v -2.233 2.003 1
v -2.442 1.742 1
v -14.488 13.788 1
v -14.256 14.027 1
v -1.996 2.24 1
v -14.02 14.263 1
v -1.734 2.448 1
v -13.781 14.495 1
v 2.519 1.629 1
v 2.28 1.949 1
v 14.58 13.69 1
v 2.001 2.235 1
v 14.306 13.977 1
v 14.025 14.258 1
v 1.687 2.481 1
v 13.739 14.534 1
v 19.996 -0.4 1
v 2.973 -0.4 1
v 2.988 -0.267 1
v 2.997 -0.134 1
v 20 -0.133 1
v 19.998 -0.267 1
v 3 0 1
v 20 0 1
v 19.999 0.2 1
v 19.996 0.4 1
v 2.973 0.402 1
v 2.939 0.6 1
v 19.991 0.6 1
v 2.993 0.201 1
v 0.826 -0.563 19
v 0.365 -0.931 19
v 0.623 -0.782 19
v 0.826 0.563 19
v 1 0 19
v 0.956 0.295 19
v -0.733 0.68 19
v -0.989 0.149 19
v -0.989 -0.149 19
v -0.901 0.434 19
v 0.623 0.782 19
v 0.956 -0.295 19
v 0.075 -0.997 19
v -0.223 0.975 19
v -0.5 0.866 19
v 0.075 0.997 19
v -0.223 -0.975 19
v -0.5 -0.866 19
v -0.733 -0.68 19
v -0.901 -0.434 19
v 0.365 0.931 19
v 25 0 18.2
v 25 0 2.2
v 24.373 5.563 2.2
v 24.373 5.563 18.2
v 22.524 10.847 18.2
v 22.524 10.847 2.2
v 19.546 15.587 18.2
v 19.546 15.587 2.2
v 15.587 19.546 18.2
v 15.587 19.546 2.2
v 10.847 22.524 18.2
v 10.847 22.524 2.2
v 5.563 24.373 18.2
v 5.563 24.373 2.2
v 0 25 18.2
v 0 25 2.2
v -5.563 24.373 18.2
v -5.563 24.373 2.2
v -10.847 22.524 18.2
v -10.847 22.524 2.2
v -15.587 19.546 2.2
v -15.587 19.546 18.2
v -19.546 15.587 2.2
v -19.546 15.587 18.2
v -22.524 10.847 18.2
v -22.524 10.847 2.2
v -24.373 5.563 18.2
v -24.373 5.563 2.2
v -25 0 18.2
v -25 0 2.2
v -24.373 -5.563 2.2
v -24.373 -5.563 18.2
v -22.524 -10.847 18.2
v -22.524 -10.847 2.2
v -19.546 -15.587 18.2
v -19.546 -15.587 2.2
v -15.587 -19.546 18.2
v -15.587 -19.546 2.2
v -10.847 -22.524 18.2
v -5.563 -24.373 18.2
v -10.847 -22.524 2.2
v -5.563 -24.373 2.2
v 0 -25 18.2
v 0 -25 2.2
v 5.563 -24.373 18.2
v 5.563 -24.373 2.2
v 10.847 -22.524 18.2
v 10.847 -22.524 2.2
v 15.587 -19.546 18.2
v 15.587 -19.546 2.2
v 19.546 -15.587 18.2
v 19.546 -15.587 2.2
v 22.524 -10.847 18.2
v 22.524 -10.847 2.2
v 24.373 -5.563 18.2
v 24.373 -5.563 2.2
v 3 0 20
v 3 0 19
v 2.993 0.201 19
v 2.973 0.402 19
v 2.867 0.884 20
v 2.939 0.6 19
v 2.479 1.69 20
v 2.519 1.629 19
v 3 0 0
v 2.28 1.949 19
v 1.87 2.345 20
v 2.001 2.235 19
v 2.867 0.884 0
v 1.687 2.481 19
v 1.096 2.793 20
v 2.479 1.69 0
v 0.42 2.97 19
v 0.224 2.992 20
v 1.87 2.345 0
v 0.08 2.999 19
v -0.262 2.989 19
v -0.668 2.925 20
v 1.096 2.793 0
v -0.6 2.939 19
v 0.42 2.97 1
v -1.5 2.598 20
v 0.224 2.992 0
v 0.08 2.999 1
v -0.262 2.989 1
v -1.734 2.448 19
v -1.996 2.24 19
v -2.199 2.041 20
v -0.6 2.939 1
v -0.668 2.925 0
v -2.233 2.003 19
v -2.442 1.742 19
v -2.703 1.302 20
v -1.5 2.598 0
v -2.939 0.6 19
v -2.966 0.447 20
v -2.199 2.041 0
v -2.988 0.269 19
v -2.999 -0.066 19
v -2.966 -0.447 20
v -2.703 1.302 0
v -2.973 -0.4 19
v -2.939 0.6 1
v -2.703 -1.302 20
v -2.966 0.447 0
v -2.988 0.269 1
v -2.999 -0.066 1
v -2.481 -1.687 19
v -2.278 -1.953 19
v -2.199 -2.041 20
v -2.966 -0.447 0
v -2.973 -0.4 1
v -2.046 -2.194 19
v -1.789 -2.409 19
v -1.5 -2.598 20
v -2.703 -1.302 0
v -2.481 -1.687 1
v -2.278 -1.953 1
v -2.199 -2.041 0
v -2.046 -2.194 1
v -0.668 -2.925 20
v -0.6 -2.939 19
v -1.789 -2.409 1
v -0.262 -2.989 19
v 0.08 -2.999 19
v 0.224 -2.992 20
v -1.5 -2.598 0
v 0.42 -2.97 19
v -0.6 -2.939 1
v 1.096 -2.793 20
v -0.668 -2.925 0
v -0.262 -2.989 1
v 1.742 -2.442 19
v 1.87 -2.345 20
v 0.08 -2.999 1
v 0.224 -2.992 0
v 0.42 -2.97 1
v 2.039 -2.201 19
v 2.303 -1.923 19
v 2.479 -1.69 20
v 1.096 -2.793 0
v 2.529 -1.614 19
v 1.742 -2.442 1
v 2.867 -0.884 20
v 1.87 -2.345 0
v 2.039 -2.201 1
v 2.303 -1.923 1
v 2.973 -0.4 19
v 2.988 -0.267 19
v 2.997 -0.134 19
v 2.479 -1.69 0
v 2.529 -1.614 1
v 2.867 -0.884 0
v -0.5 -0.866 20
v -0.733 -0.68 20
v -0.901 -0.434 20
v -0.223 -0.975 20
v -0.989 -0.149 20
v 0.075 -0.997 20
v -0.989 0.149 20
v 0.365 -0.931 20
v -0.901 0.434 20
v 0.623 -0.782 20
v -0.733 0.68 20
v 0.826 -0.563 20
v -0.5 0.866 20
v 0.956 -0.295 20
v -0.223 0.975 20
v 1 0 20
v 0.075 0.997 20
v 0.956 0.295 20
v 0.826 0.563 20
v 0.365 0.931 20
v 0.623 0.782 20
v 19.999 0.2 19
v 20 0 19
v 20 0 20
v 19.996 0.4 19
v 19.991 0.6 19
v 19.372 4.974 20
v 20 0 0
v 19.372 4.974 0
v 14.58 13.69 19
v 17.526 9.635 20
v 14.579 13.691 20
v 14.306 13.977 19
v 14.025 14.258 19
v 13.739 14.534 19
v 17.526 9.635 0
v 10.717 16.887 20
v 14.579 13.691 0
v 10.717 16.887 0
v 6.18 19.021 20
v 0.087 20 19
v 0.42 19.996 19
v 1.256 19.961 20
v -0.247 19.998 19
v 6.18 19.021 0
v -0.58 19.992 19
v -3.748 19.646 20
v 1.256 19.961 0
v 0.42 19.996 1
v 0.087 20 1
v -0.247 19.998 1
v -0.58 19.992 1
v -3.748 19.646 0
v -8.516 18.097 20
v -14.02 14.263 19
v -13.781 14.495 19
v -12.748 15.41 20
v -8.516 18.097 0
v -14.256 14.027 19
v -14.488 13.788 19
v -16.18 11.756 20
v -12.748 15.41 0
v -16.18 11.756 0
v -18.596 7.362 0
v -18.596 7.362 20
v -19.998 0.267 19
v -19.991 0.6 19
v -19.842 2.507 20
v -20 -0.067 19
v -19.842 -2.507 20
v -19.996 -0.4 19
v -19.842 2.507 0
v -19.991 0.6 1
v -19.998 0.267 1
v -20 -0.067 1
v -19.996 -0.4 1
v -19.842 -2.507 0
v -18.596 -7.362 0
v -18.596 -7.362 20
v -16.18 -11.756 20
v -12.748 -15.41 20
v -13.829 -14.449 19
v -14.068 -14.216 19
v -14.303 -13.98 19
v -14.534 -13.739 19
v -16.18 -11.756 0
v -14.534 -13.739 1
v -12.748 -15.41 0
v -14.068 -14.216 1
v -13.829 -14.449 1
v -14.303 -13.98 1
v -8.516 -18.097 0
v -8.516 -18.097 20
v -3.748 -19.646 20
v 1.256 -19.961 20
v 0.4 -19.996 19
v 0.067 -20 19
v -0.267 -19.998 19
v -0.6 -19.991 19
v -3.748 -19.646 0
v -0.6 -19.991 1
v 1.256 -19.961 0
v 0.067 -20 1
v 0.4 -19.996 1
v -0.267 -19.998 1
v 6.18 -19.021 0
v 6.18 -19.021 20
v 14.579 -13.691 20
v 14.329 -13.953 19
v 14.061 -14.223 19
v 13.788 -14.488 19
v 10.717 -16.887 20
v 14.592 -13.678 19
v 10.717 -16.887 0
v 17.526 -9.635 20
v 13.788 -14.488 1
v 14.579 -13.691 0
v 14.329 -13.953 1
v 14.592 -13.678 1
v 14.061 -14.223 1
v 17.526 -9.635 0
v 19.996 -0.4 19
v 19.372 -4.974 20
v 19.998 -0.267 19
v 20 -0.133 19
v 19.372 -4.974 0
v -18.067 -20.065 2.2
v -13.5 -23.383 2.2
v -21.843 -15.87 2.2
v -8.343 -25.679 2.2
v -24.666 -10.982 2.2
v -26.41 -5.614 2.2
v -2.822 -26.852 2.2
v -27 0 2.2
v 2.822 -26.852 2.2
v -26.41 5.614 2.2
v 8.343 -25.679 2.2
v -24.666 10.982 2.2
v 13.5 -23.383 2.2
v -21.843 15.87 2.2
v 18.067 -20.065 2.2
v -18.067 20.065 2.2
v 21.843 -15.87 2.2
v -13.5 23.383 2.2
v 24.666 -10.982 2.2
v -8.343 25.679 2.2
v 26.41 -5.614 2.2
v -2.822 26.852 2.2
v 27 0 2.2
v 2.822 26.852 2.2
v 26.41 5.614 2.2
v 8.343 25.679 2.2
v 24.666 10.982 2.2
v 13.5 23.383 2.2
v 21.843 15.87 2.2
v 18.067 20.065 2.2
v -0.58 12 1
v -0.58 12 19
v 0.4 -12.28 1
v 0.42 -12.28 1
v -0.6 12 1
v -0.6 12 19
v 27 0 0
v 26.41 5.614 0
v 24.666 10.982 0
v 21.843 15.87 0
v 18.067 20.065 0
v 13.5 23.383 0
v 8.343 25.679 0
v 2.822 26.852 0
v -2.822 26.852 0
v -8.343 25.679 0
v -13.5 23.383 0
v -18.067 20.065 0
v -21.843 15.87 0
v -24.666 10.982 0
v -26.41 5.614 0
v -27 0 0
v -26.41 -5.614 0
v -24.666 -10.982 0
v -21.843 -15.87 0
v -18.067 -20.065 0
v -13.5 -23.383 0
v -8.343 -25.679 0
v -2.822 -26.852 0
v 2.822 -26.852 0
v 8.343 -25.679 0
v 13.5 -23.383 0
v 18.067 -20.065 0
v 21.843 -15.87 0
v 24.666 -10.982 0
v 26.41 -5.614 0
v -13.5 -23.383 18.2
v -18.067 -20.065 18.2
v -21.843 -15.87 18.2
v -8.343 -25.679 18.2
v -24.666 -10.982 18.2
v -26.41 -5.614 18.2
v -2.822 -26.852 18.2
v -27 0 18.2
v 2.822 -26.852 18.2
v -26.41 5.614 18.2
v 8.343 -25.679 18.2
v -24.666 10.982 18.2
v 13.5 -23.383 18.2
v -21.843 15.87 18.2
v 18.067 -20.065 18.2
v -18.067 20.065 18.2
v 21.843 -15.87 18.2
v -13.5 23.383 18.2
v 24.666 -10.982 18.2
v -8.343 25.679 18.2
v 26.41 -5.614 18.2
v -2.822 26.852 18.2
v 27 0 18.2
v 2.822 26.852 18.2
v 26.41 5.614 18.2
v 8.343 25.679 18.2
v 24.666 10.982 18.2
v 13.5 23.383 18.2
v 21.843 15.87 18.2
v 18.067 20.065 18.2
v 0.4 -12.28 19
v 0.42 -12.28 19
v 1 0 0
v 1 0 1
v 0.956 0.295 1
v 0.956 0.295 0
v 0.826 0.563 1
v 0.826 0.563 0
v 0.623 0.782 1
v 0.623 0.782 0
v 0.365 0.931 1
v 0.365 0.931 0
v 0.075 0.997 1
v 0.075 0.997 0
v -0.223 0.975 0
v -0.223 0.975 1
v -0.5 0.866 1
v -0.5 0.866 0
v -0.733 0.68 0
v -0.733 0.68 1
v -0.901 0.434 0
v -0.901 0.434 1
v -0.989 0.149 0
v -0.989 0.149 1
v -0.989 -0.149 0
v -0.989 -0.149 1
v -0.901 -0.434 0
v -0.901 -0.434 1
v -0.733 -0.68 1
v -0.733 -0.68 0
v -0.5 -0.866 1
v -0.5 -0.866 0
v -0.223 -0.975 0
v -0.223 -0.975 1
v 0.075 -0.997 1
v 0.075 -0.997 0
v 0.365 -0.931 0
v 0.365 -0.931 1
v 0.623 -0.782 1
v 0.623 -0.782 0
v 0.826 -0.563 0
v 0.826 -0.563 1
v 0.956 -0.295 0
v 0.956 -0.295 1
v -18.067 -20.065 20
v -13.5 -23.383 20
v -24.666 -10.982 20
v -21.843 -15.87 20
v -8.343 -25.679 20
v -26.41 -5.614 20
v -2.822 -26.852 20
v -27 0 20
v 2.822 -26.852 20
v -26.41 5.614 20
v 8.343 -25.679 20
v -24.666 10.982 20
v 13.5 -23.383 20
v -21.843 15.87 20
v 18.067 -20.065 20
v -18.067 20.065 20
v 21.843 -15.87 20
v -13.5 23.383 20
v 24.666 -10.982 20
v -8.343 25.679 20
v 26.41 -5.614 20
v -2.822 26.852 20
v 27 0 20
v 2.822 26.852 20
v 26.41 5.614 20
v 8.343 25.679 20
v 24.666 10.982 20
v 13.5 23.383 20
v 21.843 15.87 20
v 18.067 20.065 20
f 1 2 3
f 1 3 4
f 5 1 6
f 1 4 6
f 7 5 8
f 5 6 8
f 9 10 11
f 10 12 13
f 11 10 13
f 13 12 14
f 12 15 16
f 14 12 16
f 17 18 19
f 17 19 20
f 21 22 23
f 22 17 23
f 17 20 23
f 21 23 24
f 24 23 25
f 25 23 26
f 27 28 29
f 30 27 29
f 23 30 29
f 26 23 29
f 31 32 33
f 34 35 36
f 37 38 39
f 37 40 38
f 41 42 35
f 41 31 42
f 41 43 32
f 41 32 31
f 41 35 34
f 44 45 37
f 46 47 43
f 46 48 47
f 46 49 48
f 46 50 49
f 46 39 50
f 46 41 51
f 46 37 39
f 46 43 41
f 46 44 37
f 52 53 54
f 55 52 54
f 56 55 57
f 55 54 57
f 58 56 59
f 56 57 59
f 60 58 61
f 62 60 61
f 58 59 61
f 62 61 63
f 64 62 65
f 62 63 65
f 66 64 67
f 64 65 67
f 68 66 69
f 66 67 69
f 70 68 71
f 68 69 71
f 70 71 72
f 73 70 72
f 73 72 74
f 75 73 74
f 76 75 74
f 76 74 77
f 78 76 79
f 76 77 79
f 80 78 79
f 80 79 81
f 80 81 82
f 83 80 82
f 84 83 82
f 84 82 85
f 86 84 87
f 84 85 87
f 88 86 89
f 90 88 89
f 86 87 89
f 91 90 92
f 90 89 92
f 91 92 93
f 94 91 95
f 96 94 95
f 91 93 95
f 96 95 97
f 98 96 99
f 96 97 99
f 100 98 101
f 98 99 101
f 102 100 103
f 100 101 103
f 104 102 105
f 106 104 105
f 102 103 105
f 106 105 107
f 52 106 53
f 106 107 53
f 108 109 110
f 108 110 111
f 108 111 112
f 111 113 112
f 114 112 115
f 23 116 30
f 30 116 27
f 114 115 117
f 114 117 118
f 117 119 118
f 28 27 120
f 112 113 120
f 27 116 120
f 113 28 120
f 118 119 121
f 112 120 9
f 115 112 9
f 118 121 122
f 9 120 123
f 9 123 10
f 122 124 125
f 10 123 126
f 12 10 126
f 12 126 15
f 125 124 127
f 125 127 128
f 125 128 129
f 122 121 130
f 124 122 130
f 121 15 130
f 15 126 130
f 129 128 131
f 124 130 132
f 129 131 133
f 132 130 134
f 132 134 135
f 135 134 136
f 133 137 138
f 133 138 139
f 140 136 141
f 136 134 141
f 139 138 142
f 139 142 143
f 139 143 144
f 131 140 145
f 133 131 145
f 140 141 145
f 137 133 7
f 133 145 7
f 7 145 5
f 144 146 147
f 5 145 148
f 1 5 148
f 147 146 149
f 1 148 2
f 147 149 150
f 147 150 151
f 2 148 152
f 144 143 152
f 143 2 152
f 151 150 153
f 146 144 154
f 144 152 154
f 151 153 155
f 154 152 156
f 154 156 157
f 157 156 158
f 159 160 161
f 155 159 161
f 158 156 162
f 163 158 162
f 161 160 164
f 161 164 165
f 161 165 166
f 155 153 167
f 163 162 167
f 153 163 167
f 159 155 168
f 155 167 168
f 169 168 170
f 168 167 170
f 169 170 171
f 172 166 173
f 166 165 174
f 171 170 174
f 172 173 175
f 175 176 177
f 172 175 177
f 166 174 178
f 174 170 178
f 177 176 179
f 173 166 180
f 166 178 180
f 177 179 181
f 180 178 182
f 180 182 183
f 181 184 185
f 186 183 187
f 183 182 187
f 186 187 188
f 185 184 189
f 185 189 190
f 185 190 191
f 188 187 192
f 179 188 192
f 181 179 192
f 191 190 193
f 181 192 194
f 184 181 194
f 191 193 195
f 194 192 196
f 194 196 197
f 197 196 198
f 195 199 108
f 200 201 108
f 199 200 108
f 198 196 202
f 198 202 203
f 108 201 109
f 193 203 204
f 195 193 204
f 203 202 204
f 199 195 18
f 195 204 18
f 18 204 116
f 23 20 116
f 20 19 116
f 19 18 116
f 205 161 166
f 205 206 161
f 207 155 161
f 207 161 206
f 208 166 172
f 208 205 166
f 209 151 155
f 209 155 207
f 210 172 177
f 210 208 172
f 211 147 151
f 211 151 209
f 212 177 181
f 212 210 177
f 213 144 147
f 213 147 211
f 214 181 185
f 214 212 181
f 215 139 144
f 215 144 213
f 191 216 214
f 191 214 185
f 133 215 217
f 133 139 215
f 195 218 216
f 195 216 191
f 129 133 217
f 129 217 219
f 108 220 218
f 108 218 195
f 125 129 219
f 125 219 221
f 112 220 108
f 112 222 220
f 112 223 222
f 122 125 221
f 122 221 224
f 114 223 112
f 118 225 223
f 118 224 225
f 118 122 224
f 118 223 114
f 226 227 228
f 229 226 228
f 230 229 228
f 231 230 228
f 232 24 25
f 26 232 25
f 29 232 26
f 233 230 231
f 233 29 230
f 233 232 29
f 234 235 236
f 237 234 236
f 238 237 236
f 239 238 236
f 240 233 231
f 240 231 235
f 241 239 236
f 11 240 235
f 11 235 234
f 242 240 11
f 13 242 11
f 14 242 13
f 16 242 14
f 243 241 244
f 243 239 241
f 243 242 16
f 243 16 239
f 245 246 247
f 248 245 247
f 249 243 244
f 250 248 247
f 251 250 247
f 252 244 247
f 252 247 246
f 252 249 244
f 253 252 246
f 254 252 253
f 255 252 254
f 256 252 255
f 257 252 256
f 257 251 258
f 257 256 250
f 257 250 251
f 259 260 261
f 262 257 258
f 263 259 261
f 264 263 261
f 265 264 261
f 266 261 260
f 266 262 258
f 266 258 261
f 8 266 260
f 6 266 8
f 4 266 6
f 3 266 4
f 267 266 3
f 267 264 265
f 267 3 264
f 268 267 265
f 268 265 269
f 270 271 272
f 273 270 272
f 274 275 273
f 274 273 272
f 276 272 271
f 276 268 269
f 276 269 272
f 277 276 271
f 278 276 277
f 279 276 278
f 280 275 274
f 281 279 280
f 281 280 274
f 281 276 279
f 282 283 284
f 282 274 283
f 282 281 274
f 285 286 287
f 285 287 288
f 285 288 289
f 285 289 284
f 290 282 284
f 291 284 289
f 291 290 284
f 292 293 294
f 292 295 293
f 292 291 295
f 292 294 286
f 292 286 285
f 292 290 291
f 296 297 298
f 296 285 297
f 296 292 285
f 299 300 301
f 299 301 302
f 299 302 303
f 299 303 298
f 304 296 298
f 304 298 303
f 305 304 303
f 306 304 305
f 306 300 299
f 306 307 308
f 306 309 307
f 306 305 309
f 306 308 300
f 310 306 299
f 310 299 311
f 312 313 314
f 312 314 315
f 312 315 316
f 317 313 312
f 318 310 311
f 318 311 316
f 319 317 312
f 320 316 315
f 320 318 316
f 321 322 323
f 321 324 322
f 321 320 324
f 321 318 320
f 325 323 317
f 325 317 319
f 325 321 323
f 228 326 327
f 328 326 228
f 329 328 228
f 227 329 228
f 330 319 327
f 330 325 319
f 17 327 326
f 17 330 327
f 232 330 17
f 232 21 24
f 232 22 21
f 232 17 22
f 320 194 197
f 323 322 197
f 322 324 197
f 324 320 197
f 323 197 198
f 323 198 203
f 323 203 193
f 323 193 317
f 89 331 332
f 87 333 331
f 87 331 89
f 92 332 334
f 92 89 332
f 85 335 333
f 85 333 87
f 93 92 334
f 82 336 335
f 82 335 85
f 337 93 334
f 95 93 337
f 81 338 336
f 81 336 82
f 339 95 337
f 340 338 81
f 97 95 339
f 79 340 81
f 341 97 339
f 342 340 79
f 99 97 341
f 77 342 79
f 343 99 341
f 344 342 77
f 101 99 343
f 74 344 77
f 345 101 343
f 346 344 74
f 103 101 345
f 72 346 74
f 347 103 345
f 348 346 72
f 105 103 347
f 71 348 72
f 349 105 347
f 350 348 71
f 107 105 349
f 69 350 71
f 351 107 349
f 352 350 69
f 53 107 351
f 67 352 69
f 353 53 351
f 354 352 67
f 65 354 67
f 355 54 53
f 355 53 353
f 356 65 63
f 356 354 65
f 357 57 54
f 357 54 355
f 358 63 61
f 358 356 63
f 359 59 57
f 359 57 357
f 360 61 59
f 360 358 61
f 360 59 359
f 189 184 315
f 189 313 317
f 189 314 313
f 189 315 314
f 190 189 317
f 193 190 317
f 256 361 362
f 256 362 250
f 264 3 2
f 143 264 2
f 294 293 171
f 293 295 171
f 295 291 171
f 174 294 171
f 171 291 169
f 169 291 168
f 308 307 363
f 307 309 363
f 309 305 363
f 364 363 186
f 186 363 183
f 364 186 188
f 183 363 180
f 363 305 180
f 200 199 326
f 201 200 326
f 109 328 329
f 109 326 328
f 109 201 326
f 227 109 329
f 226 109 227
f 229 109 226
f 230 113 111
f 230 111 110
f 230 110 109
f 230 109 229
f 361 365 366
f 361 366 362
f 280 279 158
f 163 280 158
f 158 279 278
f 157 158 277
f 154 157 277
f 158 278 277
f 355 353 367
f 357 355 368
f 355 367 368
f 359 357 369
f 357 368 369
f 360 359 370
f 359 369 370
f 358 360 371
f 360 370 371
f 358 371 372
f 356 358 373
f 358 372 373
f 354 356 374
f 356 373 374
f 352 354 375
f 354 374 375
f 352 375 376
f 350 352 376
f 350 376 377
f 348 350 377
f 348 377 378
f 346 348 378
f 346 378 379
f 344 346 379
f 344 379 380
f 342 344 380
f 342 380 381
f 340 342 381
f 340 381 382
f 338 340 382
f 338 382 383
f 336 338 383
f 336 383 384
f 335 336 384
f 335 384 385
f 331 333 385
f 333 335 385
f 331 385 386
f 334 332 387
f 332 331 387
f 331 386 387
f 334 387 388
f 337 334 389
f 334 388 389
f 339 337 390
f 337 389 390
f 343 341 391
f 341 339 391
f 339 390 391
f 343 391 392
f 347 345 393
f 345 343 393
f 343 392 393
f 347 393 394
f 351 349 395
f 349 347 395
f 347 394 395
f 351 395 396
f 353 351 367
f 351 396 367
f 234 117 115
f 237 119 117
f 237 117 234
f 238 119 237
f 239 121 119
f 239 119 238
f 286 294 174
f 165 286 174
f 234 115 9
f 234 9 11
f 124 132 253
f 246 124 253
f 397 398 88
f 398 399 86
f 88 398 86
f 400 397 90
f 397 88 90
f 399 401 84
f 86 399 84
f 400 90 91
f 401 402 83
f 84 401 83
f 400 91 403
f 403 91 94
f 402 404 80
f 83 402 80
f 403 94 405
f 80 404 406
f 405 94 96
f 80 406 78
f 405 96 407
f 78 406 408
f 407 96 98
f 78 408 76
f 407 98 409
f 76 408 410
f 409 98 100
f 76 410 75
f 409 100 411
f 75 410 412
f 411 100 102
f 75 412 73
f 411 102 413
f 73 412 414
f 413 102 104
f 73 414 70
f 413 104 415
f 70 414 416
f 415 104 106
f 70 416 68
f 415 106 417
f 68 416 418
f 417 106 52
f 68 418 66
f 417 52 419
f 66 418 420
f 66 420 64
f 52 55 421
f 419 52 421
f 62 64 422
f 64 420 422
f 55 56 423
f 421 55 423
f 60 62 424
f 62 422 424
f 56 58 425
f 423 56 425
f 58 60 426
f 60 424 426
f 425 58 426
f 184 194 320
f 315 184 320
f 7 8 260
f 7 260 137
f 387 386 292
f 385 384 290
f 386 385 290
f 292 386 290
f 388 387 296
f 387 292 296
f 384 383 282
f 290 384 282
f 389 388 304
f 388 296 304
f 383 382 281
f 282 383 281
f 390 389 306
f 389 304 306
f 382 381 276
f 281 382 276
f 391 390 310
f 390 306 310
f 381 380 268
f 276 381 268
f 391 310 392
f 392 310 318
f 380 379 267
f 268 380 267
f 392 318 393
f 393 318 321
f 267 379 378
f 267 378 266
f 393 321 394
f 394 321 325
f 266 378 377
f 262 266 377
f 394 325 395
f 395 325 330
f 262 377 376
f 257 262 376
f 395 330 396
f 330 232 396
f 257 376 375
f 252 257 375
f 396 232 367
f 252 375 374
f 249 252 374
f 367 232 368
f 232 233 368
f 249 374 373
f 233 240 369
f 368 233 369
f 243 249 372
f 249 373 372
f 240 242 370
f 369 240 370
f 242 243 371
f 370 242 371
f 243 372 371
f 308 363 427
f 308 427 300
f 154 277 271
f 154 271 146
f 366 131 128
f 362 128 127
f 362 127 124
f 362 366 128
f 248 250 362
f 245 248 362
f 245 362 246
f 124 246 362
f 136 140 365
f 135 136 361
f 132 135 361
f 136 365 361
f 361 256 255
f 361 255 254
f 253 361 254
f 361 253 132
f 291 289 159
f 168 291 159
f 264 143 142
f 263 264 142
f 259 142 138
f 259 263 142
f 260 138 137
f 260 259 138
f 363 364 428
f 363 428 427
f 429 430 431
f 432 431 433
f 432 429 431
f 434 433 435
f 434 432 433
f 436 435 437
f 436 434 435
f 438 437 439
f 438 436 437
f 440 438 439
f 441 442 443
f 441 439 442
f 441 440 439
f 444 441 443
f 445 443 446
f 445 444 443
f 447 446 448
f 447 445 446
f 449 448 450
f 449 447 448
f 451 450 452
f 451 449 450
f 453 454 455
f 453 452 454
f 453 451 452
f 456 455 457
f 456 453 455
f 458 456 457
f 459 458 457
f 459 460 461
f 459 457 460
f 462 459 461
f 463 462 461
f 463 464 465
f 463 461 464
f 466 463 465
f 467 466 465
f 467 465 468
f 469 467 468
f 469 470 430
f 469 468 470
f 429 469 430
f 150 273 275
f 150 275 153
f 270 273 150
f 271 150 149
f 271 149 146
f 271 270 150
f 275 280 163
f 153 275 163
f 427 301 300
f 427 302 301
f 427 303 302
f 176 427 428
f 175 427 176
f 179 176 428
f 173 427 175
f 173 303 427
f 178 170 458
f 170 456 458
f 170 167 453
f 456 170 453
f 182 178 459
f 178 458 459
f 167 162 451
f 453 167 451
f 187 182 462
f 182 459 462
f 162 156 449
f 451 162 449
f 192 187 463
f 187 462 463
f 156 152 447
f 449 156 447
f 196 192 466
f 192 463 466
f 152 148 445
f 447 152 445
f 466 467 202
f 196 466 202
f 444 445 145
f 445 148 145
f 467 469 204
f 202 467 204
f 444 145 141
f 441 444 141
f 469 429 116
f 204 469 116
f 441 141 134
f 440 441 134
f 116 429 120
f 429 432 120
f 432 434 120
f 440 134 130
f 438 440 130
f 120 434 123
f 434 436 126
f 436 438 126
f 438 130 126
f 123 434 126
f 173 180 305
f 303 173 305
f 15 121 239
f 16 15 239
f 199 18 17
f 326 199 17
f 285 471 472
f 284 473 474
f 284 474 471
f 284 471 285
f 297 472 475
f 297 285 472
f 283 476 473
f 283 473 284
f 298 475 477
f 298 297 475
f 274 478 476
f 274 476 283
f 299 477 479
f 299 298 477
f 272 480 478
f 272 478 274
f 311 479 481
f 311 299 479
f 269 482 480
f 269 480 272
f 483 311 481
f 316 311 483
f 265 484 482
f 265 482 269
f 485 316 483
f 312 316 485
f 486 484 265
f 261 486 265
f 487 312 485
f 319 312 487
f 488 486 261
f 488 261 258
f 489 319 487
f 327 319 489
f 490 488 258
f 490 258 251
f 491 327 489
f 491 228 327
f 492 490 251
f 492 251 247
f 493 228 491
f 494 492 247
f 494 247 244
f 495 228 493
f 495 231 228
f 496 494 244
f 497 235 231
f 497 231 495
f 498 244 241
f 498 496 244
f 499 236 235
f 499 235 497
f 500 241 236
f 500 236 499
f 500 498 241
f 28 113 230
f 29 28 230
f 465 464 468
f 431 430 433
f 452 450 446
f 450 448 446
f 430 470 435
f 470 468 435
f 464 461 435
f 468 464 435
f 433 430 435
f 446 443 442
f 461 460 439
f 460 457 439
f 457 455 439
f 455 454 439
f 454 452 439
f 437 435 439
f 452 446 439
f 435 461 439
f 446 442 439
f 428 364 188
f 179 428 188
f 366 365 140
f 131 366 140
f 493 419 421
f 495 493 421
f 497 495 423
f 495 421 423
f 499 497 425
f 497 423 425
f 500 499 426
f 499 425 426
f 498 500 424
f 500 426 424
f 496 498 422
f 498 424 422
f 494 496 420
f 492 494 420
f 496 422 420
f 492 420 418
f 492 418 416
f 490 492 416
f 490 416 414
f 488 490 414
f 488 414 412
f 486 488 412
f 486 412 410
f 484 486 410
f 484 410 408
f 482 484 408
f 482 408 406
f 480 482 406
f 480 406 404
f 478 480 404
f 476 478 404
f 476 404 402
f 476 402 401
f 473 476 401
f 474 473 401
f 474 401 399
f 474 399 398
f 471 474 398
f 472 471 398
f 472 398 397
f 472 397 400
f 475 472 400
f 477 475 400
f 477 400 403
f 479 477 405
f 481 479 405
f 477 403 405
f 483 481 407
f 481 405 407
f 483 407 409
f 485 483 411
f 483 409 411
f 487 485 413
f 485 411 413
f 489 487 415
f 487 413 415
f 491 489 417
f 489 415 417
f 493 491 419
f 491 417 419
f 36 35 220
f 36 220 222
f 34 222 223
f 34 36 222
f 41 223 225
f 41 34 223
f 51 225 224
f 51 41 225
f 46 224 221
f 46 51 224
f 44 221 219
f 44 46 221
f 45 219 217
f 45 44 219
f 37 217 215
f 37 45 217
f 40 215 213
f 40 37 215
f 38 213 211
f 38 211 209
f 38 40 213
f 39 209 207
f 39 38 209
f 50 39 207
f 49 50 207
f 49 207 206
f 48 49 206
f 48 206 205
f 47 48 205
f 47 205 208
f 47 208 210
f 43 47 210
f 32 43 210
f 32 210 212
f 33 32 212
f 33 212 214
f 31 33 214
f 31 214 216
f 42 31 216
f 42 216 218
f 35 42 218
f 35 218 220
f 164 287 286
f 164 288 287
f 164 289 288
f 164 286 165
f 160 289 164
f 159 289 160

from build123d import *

# Parameters (mm, degrees)
BOX006_W               = 35
BOX006_H               = 1
BOX006_DEPTH           = 18
BOX005_W               = 20
BOX005_H               = 1
BOX005_DEPTH           = 18
BOX004_W               = 45
BOX004_H               = 1
BOX004_DEPTH           = 18
BOX003_W               = 20
BOX003_H               = 1
BOX003_DEPTH           = 18
BOX003_PLACEMENT_ANGLE = 45
BOX002_W               = 35
BOX002_H               = 1
BOX002_DEPTH           = 18
BOX001_W               = 45
BOX001_H               = 1
BOX001_DEPTH           = 18
BOX001_PLACEMENT_ANGLE = 45
BOX_W                  = 20
BOX_H                  = 1
BOX_DEPTH              = 18
BOX_PLACEMENT_ANGLE    = 45
TUBE003_R              = 3
TUBE003_R_2            = 1
TUBE003_DEPTH          = 20
BOX007_W               = 45
BOX007_H               = 1
BOX007_DEPTH           = 18
BOX007_PLACEMENT_ANGLE = 45
TUBE002_R              = 20
TUBE002_R_2            = 2
TUBE002_DEPTH          = 25
TUBE001_R              = 40
TUBE001_R_2            = 25
TUBE001_DEPTH          = 16
TUBE_R                 = 27
TUBE_R_2               = 15
TUBE_DEPTH             = 20


with BuildPart() as cubo006:
    # Box006 → Box006 (new body)
    with BuildSketch(Plane(origin=(-0.6, 12, 1), x_dir=(0, -1, 0), z_dir=(0, 0, 1))):
        with Locations((17.5, 0.5)):
            Rectangle(BOX006_W, BOX006_H)
    extrude(amount=BOX006_DEPTH)


with BuildPart() as cubo005:
    # Box005 → Box005 (new body)
    with BuildSketch(Plane(origin=(1.8, -0.4, 1), x_dir=(1, 0, 0), z_dir=(0, 0, 1))):
        with Locations((10, 0.5)):
            Rectangle(BOX005_W, BOX005_H)
    extrude(amount=BOX005_DEPTH)


with BuildPart() as cubo004:
    # Box004 → Box004 (new body)
    with BuildSketch(Plane(origin=(-22.4, -0.4, 1), x_dir=(1, 0, 0), z_dir=(0, 0, 1))):
        with Locations((22.5, 0.5)):
            Rectangle(BOX004_W, BOX004_H)
    extrude(amount=BOX004_DEPTH)


with BuildPart() as cubo003:
    # Box003 → Box003 (new body)
    with BuildSketch(Plane.XY):
        with Locations((10, 0.5)):
            Rectangle(BOX003_W, BOX003_H)
    extrude(amount=BOX003_DEPTH)


with BuildPart() as cubo003_1:
    # Box003 placement: moved
    add(cubo003.part.moved(Location((2.23, 1.34, 1))).rotate(Axis((2.23, 1.34, 1), (0, 0, 1)), BOX003_PLACEMENT_ANGLE))


with BuildPart() as cubo002:
    # Box002 → Box002 (new body)
    with BuildSketch(Plane(origin=(0.42, -12.28, 1), x_dir=(0, 1, 0), z_dir=(0, 0, 1))):
        with Locations((17.5, 0.5)):
            Rectangle(BOX002_W, BOX002_H)
    extrude(amount=BOX002_DEPTH)


with BuildPart() as cubo001:
    # Box001 → Box001 (new body)
    with BuildSketch(Plane.XY):
        with Locations((22.5, 0.5)):
            Rectangle(BOX001_W, BOX001_H)
    extrude(amount=BOX001_DEPTH)


with BuildPart() as cubo001_1:
    # Box001 placement: moved
    add(cubo001.part.moved(Location((-16.81, -17.43, 1))).rotate(Axis((-16.81, -17.43, 1), (0, 0, 1)), BOX001_PLACEMENT_ANGLE))


with BuildPart() as cubo:
    # Box → Box (new body)
    with BuildSketch(Plane.XY):
        with Locations((10, 0.5)):
            Rectangle(BOX_W, BOX_H)
    extrude(amount=BOX_DEPTH)


with BuildPart() as cubo_1:
    # Box placement: moved
    add(cubo.part.moved(Location((0.75, -1.25, 1))).rotate(Axis((0.75, -1.25, 1), (0, 0, -1)), BOX_PLACEMENT_ANGLE))


with BuildPart() as tube003:
    # Tube003 → Tube003 (new body)
    with BuildSketch(Plane.XY):
        Circle(TUBE003_R)
        Circle(TUBE003_R_2, mode=Mode.SUBTRACT)
    extrude(amount=TUBE003_DEPTH)


with BuildPart() as fusion:
    # Box007 → Box007 (new body)
    with BuildSketch(Plane.XY):
        with Locations((22.5, 0.5)):
            Rectangle(BOX007_W, BOX007_H)
    extrude(amount=BOX007_DEPTH)


with BuildPart() as fusion_1:
    # Box007 placement: moved
    add(fusion.part.moved(Location((-16.706753, 16.006753, 1))).rotate(Axis((-16.706753, 16.006753, 1), (0, 0, -1)), BOX007_PLACEMENT_ANGLE))

    # Fusion: union Cubo006, Cubo005, Cubo004, Cubo003, Cubo002, Cubo001, Cubo, Tube003
    add(cubo006.part)
    add(cubo005.part)
    add(cubo004.part)
    add(cubo003_1.part)
    add(cubo002.part)
    add(cubo001_1.part)
    add(cubo_1.part)
    add(tube003.part)


with BuildPart() as tube002:
    # Tube002 → Tube002 (new body)
    with BuildSketch(Plane.XY.offset(-2.6)):
        Circle(TUBE002_R)
        Circle(TUBE002_R_2, mode=Mode.SUBTRACT)
    extrude(amount=TUBE002_DEPTH)


with BuildPart() as tube001:
    # Tube001 → Tube001 (new body)
    with BuildSketch(Plane.XY.offset(2.2)):
        Circle(TUBE001_R)
        Circle(TUBE001_R_2, mode=Mode.SUBTRACT)
    extrude(amount=TUBE001_DEPTH)


with BuildPart() as fusion001:
    # Tube → Tube (new body)
    with BuildSketch(Plane.XY):
        Circle(TUBE_R)
        Circle(TUBE_R_2, mode=Mode.SUBTRACT)
    extrude(amount=TUBE_DEPTH)

    # Cut: cut Tube001
    add(tube001.part, mode=Mode.SUBTRACT)

    # Cut001: cut Tube002
    add(tube002.part, mode=Mode.SUBTRACT)

    # Fusion001: union Fusion
    add(fusion_1.part)


solid = fusion001.part
